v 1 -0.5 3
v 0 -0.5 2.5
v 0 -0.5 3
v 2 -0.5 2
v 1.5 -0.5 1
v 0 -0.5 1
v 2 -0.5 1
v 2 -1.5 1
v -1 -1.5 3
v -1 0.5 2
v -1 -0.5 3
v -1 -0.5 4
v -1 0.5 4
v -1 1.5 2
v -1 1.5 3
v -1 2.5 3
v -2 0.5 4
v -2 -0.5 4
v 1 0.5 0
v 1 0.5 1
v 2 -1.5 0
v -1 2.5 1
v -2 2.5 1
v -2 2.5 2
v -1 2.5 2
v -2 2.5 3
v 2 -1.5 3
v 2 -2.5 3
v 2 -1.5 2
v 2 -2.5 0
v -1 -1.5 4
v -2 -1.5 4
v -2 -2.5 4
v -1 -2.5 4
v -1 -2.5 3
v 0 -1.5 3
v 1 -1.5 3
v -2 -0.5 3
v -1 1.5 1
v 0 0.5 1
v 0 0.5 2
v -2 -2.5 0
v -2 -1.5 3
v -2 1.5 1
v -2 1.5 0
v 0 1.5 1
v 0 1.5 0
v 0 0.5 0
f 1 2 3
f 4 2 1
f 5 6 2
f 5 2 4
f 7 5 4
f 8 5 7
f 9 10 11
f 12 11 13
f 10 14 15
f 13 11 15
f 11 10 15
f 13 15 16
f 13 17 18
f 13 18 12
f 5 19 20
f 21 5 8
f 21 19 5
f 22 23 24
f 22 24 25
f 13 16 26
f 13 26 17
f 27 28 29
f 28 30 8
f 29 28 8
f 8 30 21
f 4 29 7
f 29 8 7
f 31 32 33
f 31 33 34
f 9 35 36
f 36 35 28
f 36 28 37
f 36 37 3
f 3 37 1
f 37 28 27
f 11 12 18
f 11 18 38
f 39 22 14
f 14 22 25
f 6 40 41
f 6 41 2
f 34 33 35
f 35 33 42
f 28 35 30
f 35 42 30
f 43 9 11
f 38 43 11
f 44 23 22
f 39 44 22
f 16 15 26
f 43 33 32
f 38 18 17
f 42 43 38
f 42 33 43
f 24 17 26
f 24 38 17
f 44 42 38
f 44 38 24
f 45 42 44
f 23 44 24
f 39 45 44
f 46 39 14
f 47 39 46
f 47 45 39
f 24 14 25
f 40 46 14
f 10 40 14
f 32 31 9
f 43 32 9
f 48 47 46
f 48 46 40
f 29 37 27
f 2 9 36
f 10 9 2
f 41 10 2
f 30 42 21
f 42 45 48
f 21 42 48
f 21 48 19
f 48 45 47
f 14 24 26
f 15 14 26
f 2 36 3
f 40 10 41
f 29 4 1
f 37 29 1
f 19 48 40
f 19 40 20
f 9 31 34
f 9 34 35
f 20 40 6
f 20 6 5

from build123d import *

# Parameters (mm, degrees)
SKETCH1_W           = 4
SKETCH1_H           = 5
BOSS_EXTRUDE1_DEPTH = 4
SKETCH2_W           = 3
SKETCH2_H           = 1
CUT_EXTRUDE1_DEPTH  = 6
SKETCH3_W           = 1
SKETCH3_H           = 1
CUT_EXTRUDE2_DEPTH  = 1
CUT_EXTRUDE3_DEPTH  = 1
CUT_EXTRUDE5_DEPTH  = 1
SKETCH6_W           = 2
SKETCH6_H           = 2
CUT_EXTRUDE6_DEPTH  = 2
CUT_EXTRUDE7_DEPTH  = 1
CUT_EXTRUDE8_DEPTH  = 1
CUT_EXTRUDE9_DEPTH  = 1
SKETCH12_W          = 1
SKETCH12_H          = 2.236067978
CUT_EXTRUDE10_DEPTH = 1
SKETCH14_W          = 1
SKETCH14_H          = 1.414213562
CUT_EXTRUDE11_DEPTH = 1


with BuildPart() as part:
    # Sketch1 → Boss-Extrude1 (new body)
    with BuildSketch(Plane.XY):
        Rectangle(SKETCH1_W, SKETCH1_H)
    extrude(amount=BOSS_EXTRUDE1_DEPTH)

    # Sketch2 → Cut-Extrude1 (cut, through all)
    with BuildSketch(Plane(origin=(0, 2.5, 0), x_dir=(1, 0, 0), z_dir=(0, 1, 0))):
        with Locations((0.5, -3.5)):
            Rectangle(SKETCH2_W, SKETCH2_H)
    extrude(amount=-CUT_EXTRUDE1_DEPTH, mode=Mode.SUBTRACT)

    # Sketch3 → Cut-Extrude2 (cut)
    with BuildSketch(Plane(origin=(-1, 0, 0), x_dir=(0, 0, -1), z_dir=(1, 0, 0))):
        with Locations((-3.5, -1)):
            Rectangle(SKETCH3_W, SKETCH3_H)
    extrude(amount=-CUT_EXTRUDE2_DEPTH, mode=Mode.SUBTRACT)

    # Sketch4 → Cut-Extrude3 (cut)
    with BuildSketch(Plane(origin=(-1, 0, 0), x_dir=(0, 0, -1), z_dir=(1, 0, 0))):
        Polygon((-3, 2.5), (-4, 0.5), (-4, 2.5), align=None)
    extrude(amount=-CUT_EXTRUDE3_DEPTH, mode=Mode.SUBTRACT)

    # Sketch5 → Cut-Extrude5 (cut)
    with BuildSketch(Plane(origin=(0, 2.5, 0), x_dir=(1, 0, 0), z_dir=(0, 1, 0))):
        Polygon((-2, 0), (-2, -1), (-1, -1), (-1, -3), (2, -3), (2, 0), align=None)
    extrude(amount=-CUT_EXTRUDE5_DEPTH, mode=Mode.SUBTRACT)

    # Sketch6 → Cut-Extrude6 (cut)
    with BuildSketch(Plane(origin=(0, 1.5, 0), x_dir=(1, 0, 0), z_dir=(0, 1, 0))):
        with Locations((1, -2)):
            Rectangle(SKETCH6_W, SKETCH6_H)
    extrude(amount=-CUT_EXTRUDE6_DEPTH, mode=Mode.SUBTRACT)

    # Sketch7 → Cut-Extrude7 (cut)
    with BuildSketch(Plane(origin=(0, -0.5, 0), x_dir=(1, 0, 0), z_dir=(0, 1, 0))):
        Polygon((2, -3), (2, -2), (1, -3), align=None)
    extrude(amount=-CUT_EXTRUDE7_DEPTH, mode=Mode.SUBTRACT)

    # Sketch8 → Cut-Extrude8 (cut)
    with BuildSketch(Plane(origin=(0, 0, 0), x_dir=(-1, 0, 0), z_dir=(0, 0, -1))):
        Polygon((-2, -1.5), (-2, 1.5), (0, 1.5), (0, 0.5), (-1, 0.5), align=None)
    extrude(amount=-CUT_EXTRUDE8_DEPTH, mode=Mode.SUBTRACT)

    # Sketch9 → Cut-Extrude9 (cut)
    with BuildSketch(Plane(origin=(0, 1.5, 0), x_dir=(1, 0, 0), z_dir=(0, 1, 0))):
        Polygon((0, -1), (-1, -2), (-1, -3), (0, -3), align=None)
    extrude(amount=-CUT_EXTRUDE9_DEPTH, mode=Mode.SUBTRACT)

    # Sketch12 → Cut-Extrude10 (cut)
    with BuildSketch(Plane(origin=(0, 0.9, 1.8), x_dir=(1, 0, 0), z_dir=(0, 0.447213595, 0.894427191))):
        with Locations((-0.5, -1.565247584)):
            Rectangle(SKETCH12_W, SKETCH12_H)
    extrude(amount=CUT_EXTRUDE10_DEPTH, mode=Mode.SUBTRACT)

    # Sketch14 → Cut-Extrude11 (cut)
    with BuildSketch(Plane(origin=(0.25, 0.25, 0), x_dir=(0, 0, 1), z_dir=(-0.707106781, -0.707106781, 0))):
        with Locations((2.5, 2.474873734)):
            Rectangle(SKETCH14_W, SKETCH14_H)
    extrude(amount=-CUT_EXTRUDE11_DEPTH, mode=Mode.SUBTRACT)


solid = part.part
